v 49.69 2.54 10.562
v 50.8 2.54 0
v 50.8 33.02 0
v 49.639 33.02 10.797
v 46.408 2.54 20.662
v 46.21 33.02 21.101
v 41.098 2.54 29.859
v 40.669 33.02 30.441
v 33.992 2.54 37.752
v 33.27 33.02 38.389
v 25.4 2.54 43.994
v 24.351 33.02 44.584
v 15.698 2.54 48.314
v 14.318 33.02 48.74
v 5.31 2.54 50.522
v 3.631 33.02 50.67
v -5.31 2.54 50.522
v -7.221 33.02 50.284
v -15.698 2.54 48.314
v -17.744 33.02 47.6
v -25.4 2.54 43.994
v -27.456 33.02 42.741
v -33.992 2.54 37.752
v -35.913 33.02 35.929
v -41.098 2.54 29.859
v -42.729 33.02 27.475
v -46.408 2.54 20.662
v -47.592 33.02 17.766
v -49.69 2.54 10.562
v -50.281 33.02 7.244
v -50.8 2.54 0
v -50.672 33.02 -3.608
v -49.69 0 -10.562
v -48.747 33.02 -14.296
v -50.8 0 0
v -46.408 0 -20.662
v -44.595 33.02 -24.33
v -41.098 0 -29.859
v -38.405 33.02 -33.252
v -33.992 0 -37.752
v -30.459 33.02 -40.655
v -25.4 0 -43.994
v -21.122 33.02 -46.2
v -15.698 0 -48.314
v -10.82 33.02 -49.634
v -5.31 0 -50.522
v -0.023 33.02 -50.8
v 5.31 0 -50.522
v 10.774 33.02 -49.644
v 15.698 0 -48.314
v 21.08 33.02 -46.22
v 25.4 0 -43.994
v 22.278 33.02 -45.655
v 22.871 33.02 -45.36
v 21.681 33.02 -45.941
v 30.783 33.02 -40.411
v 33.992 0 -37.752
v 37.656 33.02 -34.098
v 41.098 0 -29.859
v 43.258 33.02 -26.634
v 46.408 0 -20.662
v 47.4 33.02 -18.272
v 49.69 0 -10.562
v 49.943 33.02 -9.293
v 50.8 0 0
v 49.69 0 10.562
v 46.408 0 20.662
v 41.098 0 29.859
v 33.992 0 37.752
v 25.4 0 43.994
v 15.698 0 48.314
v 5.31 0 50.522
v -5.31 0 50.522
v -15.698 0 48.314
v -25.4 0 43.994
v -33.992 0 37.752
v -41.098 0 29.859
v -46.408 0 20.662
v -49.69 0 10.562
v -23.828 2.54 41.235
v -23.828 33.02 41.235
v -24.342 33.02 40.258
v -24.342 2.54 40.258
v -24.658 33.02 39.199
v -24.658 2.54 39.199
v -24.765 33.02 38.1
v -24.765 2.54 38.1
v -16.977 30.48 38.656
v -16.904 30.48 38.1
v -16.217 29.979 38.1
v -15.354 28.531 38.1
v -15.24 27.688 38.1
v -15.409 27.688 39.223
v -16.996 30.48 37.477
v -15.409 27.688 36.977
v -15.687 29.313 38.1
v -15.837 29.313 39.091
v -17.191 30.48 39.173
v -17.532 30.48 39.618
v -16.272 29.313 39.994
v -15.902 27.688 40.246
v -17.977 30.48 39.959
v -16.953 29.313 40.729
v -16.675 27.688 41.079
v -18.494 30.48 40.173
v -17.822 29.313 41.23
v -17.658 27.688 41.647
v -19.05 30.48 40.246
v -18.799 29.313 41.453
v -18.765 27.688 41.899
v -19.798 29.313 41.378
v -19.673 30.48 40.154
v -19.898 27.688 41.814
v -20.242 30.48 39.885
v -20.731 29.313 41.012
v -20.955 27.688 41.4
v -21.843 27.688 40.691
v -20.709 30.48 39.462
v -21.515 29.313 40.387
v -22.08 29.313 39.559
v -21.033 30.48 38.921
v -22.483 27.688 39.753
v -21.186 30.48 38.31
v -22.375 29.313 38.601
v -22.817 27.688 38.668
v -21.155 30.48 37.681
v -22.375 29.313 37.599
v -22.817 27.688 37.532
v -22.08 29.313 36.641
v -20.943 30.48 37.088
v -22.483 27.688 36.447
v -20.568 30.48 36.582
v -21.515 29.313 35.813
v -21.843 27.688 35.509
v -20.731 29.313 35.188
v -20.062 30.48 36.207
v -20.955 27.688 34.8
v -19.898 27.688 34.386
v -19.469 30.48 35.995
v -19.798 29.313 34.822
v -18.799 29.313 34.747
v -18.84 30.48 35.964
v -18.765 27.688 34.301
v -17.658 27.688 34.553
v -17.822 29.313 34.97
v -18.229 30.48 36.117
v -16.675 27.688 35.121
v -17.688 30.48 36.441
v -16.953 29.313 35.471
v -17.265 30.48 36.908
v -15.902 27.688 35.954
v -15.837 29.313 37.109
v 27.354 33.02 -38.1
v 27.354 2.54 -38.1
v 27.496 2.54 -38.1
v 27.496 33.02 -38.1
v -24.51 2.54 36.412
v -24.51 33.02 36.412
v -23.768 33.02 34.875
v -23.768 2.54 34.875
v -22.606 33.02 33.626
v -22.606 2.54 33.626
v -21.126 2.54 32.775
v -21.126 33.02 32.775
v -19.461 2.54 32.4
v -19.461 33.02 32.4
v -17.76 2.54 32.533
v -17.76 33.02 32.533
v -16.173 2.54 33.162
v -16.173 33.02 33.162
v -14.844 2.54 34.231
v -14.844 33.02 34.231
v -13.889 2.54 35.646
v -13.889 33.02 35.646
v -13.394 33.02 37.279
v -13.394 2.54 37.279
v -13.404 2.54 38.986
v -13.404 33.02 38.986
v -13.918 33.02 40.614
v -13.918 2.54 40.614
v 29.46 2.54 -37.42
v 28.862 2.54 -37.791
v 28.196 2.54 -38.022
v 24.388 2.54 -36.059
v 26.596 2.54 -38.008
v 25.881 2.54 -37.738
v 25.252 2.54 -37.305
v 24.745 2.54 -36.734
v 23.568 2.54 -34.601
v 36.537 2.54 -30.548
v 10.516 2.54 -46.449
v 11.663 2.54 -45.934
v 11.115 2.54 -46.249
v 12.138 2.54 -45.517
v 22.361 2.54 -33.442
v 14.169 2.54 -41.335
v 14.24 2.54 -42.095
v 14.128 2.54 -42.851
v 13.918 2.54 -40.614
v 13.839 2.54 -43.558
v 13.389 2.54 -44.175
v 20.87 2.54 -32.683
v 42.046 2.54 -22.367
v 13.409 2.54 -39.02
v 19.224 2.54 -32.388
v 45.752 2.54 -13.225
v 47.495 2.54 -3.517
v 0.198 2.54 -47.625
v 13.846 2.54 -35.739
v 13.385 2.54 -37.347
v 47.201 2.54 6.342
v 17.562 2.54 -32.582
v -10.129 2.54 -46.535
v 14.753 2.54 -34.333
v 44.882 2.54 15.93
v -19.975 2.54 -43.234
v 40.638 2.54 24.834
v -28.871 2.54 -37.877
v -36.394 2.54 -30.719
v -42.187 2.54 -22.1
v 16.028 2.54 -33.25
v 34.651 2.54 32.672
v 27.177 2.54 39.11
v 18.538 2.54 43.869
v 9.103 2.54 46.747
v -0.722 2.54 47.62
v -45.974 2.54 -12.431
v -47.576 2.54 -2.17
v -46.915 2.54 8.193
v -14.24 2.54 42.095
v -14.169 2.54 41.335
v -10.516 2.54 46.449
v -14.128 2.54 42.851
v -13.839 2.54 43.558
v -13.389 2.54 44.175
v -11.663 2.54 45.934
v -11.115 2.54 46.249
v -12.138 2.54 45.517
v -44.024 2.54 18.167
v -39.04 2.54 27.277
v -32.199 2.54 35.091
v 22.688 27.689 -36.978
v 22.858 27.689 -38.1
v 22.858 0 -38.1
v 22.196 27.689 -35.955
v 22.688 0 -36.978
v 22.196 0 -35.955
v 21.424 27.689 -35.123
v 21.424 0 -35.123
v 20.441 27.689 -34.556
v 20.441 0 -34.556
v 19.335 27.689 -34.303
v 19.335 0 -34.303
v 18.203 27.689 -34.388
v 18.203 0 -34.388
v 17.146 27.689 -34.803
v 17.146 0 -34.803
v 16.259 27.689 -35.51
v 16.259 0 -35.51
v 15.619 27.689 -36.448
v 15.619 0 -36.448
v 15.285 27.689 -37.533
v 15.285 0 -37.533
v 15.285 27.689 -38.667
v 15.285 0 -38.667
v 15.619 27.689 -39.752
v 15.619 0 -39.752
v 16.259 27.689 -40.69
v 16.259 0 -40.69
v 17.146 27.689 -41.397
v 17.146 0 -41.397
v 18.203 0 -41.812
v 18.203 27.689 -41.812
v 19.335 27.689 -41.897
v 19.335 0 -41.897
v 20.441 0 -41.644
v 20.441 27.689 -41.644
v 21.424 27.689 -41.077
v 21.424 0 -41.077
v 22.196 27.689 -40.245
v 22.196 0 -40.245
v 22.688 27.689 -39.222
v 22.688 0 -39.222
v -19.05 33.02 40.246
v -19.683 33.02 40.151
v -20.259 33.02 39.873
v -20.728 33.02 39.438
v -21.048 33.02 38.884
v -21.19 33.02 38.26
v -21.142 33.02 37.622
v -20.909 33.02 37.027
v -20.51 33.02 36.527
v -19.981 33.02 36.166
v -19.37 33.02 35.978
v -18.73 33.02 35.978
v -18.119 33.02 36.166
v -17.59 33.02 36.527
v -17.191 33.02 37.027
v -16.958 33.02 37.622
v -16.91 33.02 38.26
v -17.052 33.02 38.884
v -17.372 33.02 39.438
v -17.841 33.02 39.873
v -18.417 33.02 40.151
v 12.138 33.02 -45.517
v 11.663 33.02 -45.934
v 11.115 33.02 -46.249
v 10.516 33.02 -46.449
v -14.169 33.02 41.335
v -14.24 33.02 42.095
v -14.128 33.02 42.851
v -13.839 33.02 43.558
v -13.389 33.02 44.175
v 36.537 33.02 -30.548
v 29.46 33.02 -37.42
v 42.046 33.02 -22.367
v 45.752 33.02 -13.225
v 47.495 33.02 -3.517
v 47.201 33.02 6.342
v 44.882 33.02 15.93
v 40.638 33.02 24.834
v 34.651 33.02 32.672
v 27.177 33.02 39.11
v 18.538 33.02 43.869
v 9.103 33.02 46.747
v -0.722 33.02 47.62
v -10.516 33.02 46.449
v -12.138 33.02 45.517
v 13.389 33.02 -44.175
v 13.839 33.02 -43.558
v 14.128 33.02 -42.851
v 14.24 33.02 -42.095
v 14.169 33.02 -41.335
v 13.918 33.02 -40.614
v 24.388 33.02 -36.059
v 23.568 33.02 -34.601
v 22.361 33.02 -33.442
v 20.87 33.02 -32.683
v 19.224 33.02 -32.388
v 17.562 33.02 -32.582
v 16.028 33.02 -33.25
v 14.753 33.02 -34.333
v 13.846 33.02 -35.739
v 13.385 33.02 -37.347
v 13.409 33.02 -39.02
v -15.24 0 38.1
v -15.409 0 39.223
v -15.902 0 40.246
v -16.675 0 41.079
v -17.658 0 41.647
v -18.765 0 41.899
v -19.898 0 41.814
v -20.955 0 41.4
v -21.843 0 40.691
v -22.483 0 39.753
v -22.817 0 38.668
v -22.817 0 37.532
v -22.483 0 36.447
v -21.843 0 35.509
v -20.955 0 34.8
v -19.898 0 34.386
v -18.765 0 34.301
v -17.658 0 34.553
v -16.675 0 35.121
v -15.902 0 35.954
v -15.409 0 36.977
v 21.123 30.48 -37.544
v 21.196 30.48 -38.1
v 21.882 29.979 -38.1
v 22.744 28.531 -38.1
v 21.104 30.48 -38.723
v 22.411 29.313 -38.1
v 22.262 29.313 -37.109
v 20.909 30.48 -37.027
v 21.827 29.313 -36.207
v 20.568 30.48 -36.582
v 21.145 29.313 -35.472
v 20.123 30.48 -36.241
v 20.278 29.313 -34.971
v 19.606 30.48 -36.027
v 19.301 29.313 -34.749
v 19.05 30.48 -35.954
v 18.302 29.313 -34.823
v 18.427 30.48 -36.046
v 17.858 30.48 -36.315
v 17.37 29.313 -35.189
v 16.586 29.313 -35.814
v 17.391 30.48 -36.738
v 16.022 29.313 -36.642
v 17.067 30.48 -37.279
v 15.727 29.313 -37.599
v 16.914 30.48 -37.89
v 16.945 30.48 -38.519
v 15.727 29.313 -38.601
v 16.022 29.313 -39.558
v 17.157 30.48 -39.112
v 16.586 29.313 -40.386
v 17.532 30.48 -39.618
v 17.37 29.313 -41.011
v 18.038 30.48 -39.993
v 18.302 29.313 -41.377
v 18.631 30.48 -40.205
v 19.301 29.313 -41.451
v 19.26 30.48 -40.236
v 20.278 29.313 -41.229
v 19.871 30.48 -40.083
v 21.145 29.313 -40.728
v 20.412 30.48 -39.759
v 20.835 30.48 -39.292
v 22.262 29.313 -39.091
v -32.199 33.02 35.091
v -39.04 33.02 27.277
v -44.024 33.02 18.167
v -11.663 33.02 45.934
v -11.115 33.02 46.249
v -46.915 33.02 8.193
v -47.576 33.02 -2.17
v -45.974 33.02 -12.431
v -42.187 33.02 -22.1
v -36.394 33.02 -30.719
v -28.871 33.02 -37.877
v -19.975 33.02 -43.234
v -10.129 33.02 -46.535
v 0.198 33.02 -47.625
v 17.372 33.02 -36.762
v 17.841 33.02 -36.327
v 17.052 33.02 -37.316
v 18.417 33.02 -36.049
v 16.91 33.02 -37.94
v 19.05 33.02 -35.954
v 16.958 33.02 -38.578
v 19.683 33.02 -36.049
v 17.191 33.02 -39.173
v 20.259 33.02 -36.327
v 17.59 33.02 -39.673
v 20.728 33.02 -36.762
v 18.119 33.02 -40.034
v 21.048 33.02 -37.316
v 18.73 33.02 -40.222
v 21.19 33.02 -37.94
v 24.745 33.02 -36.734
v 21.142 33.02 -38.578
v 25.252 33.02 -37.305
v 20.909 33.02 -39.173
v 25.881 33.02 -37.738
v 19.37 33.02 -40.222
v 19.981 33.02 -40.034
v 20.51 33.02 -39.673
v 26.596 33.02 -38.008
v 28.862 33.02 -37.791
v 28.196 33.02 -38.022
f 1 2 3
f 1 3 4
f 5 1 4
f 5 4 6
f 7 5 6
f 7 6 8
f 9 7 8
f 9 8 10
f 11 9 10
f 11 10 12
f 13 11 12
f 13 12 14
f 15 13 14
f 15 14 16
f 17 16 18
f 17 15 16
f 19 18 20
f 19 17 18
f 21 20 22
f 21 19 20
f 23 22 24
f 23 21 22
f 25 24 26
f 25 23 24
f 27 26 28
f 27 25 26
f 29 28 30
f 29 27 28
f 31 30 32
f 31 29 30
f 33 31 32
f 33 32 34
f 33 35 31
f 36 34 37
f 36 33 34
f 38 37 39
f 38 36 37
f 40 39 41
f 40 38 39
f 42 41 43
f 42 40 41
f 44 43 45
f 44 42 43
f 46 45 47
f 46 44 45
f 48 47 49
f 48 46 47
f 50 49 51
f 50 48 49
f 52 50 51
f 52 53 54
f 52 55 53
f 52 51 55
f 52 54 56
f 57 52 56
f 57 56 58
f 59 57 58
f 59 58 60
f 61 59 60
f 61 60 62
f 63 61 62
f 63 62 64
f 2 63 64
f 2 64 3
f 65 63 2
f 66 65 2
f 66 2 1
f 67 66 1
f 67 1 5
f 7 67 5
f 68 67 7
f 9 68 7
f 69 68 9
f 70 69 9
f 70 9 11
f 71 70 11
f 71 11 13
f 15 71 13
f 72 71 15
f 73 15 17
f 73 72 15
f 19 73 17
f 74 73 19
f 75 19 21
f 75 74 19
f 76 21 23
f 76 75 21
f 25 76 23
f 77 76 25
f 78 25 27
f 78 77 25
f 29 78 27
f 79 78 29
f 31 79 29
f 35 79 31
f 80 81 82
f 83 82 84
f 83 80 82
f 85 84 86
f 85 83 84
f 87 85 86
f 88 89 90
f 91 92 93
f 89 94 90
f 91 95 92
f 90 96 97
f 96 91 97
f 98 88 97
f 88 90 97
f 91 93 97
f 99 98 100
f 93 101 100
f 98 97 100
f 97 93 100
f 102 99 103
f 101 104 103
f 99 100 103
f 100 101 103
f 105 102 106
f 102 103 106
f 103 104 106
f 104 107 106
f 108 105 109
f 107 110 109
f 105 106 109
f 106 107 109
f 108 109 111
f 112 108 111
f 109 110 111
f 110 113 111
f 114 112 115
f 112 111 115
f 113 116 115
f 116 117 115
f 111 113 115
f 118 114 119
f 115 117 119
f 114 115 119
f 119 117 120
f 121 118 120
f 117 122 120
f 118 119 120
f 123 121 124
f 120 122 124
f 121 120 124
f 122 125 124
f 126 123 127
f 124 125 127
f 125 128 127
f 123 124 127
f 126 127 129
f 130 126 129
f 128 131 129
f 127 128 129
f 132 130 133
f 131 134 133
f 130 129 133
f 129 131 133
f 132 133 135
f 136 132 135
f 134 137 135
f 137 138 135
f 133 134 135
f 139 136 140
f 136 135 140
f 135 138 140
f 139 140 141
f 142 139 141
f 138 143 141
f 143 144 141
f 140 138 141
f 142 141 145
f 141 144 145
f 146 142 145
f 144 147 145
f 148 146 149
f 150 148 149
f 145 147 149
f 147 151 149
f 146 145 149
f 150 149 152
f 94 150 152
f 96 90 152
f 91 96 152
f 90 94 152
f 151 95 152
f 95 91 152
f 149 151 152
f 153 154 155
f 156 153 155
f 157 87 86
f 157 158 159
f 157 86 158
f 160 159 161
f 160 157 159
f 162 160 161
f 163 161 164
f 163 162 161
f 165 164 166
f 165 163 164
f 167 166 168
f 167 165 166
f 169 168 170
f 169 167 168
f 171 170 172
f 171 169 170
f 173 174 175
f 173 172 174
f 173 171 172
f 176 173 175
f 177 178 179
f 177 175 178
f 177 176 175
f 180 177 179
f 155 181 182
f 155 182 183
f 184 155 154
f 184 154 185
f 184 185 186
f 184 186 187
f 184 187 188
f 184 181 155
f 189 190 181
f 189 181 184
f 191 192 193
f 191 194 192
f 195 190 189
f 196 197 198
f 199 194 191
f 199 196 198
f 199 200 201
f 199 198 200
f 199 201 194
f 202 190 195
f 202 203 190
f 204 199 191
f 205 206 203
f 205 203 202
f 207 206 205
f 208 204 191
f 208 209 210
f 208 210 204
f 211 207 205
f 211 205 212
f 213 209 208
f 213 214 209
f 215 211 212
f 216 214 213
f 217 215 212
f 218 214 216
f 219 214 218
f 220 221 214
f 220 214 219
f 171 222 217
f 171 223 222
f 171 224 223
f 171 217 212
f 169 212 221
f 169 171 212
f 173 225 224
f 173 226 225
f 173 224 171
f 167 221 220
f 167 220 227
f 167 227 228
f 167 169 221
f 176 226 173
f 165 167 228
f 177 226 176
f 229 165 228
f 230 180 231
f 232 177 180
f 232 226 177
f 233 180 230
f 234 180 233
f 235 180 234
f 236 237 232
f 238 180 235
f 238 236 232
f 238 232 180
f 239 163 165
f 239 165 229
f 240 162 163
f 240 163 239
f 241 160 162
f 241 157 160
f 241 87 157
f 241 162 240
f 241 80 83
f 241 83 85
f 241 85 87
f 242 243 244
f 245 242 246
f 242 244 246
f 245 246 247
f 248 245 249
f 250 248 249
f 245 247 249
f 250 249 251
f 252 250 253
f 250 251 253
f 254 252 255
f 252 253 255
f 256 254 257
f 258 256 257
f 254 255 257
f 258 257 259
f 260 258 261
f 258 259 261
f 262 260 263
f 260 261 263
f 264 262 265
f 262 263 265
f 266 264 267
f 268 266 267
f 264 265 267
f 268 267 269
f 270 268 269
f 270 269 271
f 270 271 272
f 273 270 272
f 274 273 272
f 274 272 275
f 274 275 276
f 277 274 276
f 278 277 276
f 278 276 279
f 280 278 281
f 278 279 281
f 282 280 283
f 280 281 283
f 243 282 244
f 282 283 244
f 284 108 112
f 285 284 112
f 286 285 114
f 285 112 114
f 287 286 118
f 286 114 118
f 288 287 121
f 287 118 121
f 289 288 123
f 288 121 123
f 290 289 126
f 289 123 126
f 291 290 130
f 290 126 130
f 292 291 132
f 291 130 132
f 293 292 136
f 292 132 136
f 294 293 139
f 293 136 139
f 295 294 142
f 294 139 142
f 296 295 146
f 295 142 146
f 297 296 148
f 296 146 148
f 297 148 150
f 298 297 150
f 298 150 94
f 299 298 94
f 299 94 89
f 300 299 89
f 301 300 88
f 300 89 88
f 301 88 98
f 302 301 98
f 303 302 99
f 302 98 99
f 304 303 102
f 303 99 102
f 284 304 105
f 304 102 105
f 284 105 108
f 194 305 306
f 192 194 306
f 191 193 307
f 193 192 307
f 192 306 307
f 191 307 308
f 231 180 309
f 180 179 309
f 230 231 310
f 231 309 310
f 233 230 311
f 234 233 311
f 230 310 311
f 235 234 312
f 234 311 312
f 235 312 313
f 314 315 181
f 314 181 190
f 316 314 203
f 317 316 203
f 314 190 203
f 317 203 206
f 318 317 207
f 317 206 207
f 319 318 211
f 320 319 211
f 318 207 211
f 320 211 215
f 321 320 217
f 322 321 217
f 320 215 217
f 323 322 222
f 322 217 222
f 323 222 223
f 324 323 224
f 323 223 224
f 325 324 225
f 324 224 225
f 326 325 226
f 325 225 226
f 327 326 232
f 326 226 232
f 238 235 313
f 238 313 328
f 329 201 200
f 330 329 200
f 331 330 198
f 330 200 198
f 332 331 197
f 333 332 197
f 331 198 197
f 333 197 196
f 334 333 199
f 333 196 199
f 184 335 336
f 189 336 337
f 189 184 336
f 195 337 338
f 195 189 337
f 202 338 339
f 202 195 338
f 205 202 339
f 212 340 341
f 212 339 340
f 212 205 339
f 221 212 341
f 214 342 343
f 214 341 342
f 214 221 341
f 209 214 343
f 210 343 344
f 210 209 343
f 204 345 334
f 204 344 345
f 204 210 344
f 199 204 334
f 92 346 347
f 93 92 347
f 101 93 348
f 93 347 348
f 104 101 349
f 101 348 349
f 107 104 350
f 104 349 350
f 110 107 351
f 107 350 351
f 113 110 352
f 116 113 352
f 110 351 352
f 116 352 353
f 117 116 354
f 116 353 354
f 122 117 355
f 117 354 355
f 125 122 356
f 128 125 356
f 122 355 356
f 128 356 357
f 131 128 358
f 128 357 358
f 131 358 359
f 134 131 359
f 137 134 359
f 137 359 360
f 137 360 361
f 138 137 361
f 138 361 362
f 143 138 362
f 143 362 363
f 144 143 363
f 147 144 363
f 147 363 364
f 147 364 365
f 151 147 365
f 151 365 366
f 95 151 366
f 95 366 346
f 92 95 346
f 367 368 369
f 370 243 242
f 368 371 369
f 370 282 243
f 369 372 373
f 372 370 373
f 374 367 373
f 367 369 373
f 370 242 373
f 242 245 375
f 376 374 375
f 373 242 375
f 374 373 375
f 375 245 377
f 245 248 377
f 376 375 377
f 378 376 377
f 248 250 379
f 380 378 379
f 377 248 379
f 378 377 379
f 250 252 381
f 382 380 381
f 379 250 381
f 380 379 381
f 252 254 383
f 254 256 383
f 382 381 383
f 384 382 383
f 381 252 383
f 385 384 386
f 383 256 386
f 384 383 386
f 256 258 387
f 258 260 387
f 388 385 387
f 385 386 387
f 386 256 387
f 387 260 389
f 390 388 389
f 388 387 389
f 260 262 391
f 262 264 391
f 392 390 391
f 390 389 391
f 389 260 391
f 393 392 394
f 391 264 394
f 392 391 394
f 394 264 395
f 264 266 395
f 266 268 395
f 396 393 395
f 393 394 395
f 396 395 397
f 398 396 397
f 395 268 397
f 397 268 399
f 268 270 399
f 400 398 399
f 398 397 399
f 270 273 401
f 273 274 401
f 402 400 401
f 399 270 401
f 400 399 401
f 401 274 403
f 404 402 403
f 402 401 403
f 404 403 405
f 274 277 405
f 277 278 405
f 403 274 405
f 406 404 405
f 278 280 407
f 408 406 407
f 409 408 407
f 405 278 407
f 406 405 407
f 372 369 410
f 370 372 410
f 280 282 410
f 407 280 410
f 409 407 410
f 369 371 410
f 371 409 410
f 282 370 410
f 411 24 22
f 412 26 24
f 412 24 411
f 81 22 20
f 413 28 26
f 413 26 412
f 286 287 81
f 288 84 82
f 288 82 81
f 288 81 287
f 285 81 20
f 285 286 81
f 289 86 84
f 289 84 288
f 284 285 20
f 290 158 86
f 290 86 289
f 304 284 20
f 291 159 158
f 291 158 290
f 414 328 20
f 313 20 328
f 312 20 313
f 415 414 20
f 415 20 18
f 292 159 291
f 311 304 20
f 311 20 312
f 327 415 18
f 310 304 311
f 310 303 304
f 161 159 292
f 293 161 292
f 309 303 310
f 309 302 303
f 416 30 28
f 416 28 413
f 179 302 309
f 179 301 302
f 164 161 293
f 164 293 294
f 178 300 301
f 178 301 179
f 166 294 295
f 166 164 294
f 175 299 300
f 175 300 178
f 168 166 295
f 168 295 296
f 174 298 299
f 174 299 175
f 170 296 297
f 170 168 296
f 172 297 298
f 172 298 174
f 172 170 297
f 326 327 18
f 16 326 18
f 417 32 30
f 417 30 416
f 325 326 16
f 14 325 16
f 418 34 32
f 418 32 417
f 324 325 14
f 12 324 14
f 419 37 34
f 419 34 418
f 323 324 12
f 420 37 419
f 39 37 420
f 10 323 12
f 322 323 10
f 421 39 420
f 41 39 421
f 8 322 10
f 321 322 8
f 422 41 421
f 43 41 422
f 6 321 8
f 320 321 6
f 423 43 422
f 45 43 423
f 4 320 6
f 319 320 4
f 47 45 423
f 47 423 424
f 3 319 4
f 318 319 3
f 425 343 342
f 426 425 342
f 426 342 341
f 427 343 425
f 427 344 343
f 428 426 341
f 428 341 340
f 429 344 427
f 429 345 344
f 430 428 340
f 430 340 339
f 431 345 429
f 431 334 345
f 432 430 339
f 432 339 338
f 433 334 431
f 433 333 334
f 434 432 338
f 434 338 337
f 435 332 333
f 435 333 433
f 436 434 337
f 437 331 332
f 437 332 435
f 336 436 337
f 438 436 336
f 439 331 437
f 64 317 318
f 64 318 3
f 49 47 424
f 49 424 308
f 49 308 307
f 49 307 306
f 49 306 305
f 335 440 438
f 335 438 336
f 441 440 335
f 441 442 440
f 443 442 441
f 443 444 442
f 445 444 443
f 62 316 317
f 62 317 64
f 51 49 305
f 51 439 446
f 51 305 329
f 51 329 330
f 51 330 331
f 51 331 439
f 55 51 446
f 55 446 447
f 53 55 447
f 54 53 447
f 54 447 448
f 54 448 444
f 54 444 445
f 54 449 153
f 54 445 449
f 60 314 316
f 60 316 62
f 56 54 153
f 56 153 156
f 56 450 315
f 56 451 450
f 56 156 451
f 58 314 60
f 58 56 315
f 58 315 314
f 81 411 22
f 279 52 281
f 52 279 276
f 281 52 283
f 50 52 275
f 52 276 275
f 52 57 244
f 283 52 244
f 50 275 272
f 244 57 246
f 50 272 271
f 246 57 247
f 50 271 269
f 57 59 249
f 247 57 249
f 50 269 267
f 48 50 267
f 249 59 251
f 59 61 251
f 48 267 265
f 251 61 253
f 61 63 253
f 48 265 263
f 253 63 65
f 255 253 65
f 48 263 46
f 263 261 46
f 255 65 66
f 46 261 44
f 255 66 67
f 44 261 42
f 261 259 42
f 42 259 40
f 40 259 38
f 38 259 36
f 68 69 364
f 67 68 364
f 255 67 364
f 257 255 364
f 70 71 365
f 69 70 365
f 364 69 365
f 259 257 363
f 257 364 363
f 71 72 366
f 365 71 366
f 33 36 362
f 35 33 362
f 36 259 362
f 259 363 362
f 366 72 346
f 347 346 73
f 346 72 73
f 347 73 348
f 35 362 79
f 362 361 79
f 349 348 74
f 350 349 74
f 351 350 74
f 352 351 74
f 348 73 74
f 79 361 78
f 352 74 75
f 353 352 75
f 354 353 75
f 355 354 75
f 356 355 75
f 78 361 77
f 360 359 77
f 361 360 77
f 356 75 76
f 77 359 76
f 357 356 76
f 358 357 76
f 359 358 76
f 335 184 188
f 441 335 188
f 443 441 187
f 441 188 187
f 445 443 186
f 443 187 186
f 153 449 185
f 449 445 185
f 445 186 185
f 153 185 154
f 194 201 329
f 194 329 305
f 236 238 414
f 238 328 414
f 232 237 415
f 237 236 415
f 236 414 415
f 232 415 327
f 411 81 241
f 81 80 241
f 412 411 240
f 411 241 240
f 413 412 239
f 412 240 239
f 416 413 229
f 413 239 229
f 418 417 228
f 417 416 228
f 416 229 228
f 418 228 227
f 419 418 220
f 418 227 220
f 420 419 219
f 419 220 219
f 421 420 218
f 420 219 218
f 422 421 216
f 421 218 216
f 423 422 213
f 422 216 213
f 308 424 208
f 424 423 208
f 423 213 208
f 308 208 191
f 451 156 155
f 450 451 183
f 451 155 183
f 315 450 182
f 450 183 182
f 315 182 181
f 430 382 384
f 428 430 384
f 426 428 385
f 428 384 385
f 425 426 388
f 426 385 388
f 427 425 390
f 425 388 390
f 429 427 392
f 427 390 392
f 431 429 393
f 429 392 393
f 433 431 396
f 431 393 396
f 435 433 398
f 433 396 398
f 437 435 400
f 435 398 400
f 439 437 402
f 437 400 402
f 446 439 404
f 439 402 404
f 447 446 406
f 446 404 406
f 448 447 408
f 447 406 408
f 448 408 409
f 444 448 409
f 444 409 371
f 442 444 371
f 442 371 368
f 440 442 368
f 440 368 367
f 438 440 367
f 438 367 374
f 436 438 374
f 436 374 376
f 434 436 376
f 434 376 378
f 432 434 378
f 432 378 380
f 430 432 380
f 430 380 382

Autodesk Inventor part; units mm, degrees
ref_plane "YZ Plane" through (0, 0, 0) normal (1, 0, 0) x (0, 1, 0)
ref_plane "XZ Plane" through (0, 0, 0) normal (0, 1, 0) x (-1, 0, 0)
ref_plane "XY Plane" through (0, 0, 0) normal (0, 0, 1) x (1, 0, 0)
sketch "Sketch1" plane through (0, 0, 0) normal (0, 1, 0) x (-1, 0, 0)
  circle A0 centre (0, 0) radius 50.8
  dimension "d0" = 101.6
extrude "Extrusion1" add sketch "Sketch1" along normal blind 2.54
sketch "Sketch2" plane through (0, 2.54, 0) normal (0, 1, 0) x (1, 0, 0)
  circle A0 centre (0, 0) radius 47.625
  circle A1 centre (0, 0) radius 50.8
  dimension "d3" = 95.25
  dimension "d4" = 101.6
extrude "Extrusion2" add sketch "Sketch2" along normal blind 30.48
sketch "Sketch3" plane through (0, 2.54, 0) normal (0, 1, 0) x (1, 0, 0)
  line L0 (0, 0) -> (0, 38.1)
  line L1 (0, 0) -> (0, -38.1)
  line L2 (0, -38.1) -> (-19.05, -38.1)
  line L3 (0, 38.1) -> (19.05, 38.1)
  circle A0 centre (19.05, 38.1) radius 5.715
  circle A1 centre (-19.05, -38.1) radius 5.715
  dimension "d9" = 38.1
  dimension "d10" = 19.05
  dimension "d11" = 11.43
  dimension "d12" = 11.43
extrude "Extrusion3" add sketch "Sketch3" along normal blind 30.48
sketch "Sketch4" plane through (0, 2.54, 0) normal (0, 1, 0) x (1, 0, 0)
  arc A0 (18.6915, 43.8037) -> (23.8281, 41.2355) centre (19.05, 38.1) ccw projected
  line L0 (19.05, 38.1) -> (11.4832, 46.2199)
  arc A1 (-18.6915, -43.8037) -> (23.8281, 41.2355) centre (0, 0) ccw projected
  line L1 (19.05, 38.1) -> (29.6369, 38.1)
  line L2 (29.6369, 38.1) -> (22.8712, 45.3602)
  circle A2 centre (0, 0) radius 50.8 projected
  arc A3 (-18.6915, -43.8037) -> (-23.8281, -41.2355) centre (-19.05, -38.1) ccw projected
  line L3 (-19.05, -38.1) -> (-28.575, -38.1)
  line L4 (-19.05, -38.1) -> (-11.4832, -46.2199)
  line L5 (-21.0799, -46.2199) -> (-28.575, -38.1)
  line L6 (11.4832, 46.2199) -> (21.0799, 46.2199)
  line L7 (21.0799, 46.2199) -> (22.8712, 45.3602)
  line L8 (-11.4832, -46.2199) -> (-21.0799, -46.2199)
  line L9 (-21.0799, -46.2199) -> (-28.575, -38.1)
  point P0 (-15.1538, -42.281)
  point P1 (-24.765, -38.1)
extrude "Extrusion4" add sketch "Sketch4" along normal blind 30.48 contours L0 L6 L7 L2 L1 A1 A0 | A0 A1 L1 | A1 A3 L4 | L4 L3 A3
fillet "Fillet1" radius 3.175 6 edges at (24.765, 17.78, -38.1) (28.575, 17.78, -38.1) (11.4832, 17.78, -46.2199) (15.1538, 17.78, -42.281) (-11.4832, 17.78, 46.2199) (-15.1538, 17.78, 42.281)
sketch "Sketch5" plane through (0, 33.02, 0) normal (0, 1, 0) x (1, 0, 0)
  arc A0 (13.9175, 40.6138) -> (24.3881, 36.0589) centre (19.05, 38.1) ccw projected
  line L0 (19.05, 32.385) -> (19.05, 38.1)
  arc A1 (-13.9175, -40.6138) -> (-23.8281, -41.2355) centre (-19.05, -38.1) ccw projected
  line L1 (-19.05, -32.385) -> (-19.05, -38.1)
  point P0 (0, 0)
  point P1 (-22.4437, -36.3682)
hole "Hole1" at (19.05, 33.02, -38.1) at (-19.05, 33.02, 38.1) direction (0, -1, 0) diameter 4.2926 end through all clearance for "Socket Head Cap Screw" size "M4" standard "Ansi Metric M Profile"
sketch "Sketch6" plane through (0, 0, 0) normal (0, -1, 0) x (1, 0, 0)
  point P0 (0, 0)
sketch "Sketch7" plane through (0, 0, 0) normal (0, -1, 0) x (1, 0, 0)
  circle A0 centre (19.05, -38.1) radius 2.1463 projected
  circle A1 centre (19.05, -38.1) radius 3.8076
  circle A2 centre (-19.05, 38.1) radius 2.1463 projected
  circle A3 centre (-19.05, 38.1) radius 3.81
  point P0 (0, 0)
  dimension "d25" = 7.62
extrude "Extrusion5" cut sketch "Sketch7" against normal blind 30.48 contours A0 | A1 | A2 | A3
fillet "Fillet2" radius 3.175 1 edges at (15.2424, 30.48, -38.1)
fillet "Fillet3" radius 3.175 1 edges at (-22.86, 30.48, 38.1)
properties part number "C0-0-01-ODriveCover"
